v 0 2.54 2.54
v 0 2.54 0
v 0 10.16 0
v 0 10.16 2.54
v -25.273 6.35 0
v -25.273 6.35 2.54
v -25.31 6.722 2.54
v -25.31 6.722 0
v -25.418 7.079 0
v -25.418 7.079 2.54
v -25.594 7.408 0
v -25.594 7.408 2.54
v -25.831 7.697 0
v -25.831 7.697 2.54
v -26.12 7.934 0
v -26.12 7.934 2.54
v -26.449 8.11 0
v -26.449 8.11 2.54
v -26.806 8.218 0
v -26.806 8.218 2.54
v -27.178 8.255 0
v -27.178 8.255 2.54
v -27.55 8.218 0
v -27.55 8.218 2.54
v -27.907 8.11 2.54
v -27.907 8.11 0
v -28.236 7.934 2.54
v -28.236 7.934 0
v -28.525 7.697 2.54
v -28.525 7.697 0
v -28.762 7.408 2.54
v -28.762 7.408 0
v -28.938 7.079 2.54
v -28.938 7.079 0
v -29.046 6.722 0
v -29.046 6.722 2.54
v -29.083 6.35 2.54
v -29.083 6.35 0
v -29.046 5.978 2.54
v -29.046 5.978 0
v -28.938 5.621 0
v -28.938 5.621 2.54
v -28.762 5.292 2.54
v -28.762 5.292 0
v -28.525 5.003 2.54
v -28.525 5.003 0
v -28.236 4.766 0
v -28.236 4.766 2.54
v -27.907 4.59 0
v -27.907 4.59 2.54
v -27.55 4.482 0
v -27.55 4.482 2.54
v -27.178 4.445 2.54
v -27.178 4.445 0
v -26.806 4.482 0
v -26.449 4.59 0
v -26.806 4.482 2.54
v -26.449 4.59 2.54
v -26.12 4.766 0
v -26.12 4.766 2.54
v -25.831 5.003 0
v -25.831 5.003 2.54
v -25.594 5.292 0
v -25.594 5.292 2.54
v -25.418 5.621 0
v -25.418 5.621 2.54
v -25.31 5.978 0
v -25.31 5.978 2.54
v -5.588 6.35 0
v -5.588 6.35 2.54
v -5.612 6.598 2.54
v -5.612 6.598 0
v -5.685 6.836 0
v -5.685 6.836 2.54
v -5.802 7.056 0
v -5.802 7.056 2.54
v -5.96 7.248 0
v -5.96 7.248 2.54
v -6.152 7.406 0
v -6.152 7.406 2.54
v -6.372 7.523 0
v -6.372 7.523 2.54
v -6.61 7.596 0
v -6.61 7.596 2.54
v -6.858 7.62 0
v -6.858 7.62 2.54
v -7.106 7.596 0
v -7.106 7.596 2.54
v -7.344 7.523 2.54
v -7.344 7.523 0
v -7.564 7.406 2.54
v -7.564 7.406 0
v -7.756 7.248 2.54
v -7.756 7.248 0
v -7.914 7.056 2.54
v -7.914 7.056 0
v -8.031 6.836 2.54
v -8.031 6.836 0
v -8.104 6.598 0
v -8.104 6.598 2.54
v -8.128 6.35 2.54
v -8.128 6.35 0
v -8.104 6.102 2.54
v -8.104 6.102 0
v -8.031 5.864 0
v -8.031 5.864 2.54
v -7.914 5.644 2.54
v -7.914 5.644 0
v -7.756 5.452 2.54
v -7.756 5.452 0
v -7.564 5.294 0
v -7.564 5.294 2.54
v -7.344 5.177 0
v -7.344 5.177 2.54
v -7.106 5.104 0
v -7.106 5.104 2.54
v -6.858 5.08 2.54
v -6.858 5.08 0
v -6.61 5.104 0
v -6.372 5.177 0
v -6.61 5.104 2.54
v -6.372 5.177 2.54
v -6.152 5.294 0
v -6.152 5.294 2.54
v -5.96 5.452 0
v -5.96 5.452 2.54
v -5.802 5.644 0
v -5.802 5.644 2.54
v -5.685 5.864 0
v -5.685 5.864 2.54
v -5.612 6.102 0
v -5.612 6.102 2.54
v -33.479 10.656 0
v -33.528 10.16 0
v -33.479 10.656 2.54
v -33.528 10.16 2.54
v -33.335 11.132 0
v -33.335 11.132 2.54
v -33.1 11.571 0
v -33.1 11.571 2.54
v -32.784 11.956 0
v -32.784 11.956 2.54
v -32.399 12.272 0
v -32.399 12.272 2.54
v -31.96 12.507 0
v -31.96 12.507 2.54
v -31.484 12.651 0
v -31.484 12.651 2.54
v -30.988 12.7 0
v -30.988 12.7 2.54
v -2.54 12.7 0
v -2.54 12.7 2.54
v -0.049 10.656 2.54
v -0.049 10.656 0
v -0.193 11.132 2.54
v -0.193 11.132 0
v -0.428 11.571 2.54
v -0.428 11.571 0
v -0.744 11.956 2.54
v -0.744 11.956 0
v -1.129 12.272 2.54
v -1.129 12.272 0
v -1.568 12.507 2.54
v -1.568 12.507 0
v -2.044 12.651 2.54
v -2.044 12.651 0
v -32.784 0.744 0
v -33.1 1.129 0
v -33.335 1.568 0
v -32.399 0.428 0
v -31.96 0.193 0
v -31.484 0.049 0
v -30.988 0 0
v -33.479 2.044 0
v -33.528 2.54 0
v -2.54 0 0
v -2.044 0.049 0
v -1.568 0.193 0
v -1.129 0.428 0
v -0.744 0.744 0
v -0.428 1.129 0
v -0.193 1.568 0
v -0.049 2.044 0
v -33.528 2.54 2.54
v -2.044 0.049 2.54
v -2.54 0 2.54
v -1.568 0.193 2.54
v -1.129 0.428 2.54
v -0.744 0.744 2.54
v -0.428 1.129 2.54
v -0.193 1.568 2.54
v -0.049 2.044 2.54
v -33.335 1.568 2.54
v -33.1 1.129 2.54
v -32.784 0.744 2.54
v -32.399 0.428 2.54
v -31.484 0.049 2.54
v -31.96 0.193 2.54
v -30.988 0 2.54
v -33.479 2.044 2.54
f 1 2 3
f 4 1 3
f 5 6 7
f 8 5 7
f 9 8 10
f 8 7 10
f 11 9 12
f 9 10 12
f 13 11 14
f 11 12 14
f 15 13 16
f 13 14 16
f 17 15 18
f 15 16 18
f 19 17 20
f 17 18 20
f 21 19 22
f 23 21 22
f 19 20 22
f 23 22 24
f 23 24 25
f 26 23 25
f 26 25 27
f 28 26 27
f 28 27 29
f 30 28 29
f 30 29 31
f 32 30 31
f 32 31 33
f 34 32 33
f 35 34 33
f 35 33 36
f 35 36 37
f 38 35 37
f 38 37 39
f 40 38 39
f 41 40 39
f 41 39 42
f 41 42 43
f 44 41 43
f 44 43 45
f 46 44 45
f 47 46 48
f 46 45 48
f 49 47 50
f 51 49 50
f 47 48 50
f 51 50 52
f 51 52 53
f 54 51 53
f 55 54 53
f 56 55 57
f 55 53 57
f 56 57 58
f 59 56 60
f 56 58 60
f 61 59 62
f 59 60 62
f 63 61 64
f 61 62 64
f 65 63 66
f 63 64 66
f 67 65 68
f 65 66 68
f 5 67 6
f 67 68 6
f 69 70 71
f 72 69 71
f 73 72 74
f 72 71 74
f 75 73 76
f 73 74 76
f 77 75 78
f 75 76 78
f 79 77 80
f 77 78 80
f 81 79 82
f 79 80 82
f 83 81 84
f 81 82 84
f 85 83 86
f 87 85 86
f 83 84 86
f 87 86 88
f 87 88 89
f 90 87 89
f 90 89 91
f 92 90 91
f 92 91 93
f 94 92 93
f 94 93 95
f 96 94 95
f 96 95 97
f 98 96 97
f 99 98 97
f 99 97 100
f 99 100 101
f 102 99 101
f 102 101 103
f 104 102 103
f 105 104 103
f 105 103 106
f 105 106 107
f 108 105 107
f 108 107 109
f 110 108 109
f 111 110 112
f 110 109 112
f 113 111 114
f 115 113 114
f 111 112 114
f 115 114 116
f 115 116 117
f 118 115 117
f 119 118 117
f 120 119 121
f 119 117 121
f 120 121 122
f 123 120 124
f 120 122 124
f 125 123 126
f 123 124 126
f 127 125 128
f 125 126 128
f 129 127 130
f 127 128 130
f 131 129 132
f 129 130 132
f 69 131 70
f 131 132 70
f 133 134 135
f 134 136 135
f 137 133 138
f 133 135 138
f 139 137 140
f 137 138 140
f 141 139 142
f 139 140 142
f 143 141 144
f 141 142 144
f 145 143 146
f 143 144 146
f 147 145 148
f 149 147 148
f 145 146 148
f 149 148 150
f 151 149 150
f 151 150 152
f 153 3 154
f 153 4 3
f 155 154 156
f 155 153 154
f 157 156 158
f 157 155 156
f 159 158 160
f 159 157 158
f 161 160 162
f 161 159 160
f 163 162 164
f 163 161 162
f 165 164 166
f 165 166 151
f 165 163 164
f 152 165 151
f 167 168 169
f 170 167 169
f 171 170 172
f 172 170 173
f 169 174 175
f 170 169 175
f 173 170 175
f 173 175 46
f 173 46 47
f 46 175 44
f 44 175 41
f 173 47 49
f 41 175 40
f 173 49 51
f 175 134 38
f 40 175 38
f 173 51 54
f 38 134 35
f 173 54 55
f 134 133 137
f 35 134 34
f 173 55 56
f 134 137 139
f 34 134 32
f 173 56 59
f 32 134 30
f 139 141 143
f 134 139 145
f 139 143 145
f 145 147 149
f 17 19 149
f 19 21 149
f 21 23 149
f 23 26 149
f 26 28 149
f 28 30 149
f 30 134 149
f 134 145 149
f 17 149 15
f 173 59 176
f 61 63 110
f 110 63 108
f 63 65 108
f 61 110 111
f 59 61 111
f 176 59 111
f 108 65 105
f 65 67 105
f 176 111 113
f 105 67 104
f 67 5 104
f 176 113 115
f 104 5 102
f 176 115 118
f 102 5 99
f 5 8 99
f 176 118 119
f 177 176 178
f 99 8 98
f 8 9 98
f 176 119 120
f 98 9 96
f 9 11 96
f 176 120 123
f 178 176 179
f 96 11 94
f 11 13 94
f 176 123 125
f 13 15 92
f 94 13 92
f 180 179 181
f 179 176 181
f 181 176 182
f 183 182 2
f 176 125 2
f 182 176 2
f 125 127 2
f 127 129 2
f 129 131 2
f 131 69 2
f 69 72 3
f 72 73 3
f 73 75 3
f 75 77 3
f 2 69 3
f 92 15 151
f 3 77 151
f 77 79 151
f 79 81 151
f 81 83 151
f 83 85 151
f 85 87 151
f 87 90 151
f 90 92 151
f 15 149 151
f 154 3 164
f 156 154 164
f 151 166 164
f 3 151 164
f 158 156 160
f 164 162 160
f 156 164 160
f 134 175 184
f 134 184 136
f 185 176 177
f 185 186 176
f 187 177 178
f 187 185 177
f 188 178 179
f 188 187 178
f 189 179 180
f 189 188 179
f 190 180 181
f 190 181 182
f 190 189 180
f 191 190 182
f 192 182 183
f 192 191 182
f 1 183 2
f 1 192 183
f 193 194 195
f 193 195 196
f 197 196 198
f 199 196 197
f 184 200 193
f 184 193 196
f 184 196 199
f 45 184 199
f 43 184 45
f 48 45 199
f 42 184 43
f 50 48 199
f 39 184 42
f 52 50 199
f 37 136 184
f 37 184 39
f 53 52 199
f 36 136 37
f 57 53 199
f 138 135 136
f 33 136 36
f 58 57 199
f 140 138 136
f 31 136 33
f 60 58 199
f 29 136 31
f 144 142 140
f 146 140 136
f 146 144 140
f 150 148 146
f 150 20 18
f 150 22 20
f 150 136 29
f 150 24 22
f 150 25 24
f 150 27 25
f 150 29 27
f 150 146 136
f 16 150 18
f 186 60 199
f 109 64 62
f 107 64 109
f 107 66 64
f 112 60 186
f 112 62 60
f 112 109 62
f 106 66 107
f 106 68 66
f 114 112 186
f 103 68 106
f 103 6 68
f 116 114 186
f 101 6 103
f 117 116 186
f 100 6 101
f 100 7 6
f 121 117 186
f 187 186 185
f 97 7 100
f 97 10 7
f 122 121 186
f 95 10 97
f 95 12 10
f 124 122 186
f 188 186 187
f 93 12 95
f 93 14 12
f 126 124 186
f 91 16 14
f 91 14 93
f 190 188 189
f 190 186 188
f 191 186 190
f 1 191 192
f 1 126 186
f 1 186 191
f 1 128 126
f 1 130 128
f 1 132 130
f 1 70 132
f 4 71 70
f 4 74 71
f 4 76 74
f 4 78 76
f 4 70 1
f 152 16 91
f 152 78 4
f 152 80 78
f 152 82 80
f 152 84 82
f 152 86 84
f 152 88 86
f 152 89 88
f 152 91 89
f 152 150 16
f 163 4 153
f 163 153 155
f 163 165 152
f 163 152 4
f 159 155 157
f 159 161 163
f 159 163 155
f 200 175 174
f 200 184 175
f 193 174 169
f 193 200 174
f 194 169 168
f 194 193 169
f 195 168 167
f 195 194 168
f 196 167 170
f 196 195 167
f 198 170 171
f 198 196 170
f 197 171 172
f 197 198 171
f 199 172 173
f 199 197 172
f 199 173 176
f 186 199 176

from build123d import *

# Parameters (mm, degrees)
SKETCH1_W           = 33.528
SKETCH1_H           = 12.7
BOSS_EXTRUDE1_DEPTH = 2.54
FILLET1_R           = 2.54
SKETCH2_R           = 1.905
SKETCH2_R_2         = 1.27
CUT_EXTRUDE1_DEPTH  = 36.942570637


with BuildPart() as part:
    # Sketch1 → Boss-Extrude1 (new body)
    with BuildSketch(Plane.XY):
        with Locations((-16.764, 6.35)):
            Rectangle(SKETCH1_W, SKETCH1_H)
    extrude(amount=BOSS_EXTRUDE1_DEPTH)

    # Fillet1
    fillet1_edges = [part.edges().sort_by_distance(p)[0] for p in [
        (0, 0, 1.27),
        (-33.528, 0, 1.27),
        (-33.528, 12.7, 1.27),
        (0, 12.7, 1.27),
    ]]
    fillet(fillet1_edges, radius=FILLET1_R)

    # Sketch2 → Cut-Extrude1 (cut, through all)
    with BuildSketch(Plane.XY.offset(2.54)):
        with Locations((-27.178, 6.35)):
            Circle(SKETCH2_R)
        with Locations((-6.858, 6.35)):
            Circle(SKETCH2_R_2)
    extrude(amount=-CUT_EXTRUDE1_DEPTH, mode=Mode.SUBTRACT)


solid = part.part
